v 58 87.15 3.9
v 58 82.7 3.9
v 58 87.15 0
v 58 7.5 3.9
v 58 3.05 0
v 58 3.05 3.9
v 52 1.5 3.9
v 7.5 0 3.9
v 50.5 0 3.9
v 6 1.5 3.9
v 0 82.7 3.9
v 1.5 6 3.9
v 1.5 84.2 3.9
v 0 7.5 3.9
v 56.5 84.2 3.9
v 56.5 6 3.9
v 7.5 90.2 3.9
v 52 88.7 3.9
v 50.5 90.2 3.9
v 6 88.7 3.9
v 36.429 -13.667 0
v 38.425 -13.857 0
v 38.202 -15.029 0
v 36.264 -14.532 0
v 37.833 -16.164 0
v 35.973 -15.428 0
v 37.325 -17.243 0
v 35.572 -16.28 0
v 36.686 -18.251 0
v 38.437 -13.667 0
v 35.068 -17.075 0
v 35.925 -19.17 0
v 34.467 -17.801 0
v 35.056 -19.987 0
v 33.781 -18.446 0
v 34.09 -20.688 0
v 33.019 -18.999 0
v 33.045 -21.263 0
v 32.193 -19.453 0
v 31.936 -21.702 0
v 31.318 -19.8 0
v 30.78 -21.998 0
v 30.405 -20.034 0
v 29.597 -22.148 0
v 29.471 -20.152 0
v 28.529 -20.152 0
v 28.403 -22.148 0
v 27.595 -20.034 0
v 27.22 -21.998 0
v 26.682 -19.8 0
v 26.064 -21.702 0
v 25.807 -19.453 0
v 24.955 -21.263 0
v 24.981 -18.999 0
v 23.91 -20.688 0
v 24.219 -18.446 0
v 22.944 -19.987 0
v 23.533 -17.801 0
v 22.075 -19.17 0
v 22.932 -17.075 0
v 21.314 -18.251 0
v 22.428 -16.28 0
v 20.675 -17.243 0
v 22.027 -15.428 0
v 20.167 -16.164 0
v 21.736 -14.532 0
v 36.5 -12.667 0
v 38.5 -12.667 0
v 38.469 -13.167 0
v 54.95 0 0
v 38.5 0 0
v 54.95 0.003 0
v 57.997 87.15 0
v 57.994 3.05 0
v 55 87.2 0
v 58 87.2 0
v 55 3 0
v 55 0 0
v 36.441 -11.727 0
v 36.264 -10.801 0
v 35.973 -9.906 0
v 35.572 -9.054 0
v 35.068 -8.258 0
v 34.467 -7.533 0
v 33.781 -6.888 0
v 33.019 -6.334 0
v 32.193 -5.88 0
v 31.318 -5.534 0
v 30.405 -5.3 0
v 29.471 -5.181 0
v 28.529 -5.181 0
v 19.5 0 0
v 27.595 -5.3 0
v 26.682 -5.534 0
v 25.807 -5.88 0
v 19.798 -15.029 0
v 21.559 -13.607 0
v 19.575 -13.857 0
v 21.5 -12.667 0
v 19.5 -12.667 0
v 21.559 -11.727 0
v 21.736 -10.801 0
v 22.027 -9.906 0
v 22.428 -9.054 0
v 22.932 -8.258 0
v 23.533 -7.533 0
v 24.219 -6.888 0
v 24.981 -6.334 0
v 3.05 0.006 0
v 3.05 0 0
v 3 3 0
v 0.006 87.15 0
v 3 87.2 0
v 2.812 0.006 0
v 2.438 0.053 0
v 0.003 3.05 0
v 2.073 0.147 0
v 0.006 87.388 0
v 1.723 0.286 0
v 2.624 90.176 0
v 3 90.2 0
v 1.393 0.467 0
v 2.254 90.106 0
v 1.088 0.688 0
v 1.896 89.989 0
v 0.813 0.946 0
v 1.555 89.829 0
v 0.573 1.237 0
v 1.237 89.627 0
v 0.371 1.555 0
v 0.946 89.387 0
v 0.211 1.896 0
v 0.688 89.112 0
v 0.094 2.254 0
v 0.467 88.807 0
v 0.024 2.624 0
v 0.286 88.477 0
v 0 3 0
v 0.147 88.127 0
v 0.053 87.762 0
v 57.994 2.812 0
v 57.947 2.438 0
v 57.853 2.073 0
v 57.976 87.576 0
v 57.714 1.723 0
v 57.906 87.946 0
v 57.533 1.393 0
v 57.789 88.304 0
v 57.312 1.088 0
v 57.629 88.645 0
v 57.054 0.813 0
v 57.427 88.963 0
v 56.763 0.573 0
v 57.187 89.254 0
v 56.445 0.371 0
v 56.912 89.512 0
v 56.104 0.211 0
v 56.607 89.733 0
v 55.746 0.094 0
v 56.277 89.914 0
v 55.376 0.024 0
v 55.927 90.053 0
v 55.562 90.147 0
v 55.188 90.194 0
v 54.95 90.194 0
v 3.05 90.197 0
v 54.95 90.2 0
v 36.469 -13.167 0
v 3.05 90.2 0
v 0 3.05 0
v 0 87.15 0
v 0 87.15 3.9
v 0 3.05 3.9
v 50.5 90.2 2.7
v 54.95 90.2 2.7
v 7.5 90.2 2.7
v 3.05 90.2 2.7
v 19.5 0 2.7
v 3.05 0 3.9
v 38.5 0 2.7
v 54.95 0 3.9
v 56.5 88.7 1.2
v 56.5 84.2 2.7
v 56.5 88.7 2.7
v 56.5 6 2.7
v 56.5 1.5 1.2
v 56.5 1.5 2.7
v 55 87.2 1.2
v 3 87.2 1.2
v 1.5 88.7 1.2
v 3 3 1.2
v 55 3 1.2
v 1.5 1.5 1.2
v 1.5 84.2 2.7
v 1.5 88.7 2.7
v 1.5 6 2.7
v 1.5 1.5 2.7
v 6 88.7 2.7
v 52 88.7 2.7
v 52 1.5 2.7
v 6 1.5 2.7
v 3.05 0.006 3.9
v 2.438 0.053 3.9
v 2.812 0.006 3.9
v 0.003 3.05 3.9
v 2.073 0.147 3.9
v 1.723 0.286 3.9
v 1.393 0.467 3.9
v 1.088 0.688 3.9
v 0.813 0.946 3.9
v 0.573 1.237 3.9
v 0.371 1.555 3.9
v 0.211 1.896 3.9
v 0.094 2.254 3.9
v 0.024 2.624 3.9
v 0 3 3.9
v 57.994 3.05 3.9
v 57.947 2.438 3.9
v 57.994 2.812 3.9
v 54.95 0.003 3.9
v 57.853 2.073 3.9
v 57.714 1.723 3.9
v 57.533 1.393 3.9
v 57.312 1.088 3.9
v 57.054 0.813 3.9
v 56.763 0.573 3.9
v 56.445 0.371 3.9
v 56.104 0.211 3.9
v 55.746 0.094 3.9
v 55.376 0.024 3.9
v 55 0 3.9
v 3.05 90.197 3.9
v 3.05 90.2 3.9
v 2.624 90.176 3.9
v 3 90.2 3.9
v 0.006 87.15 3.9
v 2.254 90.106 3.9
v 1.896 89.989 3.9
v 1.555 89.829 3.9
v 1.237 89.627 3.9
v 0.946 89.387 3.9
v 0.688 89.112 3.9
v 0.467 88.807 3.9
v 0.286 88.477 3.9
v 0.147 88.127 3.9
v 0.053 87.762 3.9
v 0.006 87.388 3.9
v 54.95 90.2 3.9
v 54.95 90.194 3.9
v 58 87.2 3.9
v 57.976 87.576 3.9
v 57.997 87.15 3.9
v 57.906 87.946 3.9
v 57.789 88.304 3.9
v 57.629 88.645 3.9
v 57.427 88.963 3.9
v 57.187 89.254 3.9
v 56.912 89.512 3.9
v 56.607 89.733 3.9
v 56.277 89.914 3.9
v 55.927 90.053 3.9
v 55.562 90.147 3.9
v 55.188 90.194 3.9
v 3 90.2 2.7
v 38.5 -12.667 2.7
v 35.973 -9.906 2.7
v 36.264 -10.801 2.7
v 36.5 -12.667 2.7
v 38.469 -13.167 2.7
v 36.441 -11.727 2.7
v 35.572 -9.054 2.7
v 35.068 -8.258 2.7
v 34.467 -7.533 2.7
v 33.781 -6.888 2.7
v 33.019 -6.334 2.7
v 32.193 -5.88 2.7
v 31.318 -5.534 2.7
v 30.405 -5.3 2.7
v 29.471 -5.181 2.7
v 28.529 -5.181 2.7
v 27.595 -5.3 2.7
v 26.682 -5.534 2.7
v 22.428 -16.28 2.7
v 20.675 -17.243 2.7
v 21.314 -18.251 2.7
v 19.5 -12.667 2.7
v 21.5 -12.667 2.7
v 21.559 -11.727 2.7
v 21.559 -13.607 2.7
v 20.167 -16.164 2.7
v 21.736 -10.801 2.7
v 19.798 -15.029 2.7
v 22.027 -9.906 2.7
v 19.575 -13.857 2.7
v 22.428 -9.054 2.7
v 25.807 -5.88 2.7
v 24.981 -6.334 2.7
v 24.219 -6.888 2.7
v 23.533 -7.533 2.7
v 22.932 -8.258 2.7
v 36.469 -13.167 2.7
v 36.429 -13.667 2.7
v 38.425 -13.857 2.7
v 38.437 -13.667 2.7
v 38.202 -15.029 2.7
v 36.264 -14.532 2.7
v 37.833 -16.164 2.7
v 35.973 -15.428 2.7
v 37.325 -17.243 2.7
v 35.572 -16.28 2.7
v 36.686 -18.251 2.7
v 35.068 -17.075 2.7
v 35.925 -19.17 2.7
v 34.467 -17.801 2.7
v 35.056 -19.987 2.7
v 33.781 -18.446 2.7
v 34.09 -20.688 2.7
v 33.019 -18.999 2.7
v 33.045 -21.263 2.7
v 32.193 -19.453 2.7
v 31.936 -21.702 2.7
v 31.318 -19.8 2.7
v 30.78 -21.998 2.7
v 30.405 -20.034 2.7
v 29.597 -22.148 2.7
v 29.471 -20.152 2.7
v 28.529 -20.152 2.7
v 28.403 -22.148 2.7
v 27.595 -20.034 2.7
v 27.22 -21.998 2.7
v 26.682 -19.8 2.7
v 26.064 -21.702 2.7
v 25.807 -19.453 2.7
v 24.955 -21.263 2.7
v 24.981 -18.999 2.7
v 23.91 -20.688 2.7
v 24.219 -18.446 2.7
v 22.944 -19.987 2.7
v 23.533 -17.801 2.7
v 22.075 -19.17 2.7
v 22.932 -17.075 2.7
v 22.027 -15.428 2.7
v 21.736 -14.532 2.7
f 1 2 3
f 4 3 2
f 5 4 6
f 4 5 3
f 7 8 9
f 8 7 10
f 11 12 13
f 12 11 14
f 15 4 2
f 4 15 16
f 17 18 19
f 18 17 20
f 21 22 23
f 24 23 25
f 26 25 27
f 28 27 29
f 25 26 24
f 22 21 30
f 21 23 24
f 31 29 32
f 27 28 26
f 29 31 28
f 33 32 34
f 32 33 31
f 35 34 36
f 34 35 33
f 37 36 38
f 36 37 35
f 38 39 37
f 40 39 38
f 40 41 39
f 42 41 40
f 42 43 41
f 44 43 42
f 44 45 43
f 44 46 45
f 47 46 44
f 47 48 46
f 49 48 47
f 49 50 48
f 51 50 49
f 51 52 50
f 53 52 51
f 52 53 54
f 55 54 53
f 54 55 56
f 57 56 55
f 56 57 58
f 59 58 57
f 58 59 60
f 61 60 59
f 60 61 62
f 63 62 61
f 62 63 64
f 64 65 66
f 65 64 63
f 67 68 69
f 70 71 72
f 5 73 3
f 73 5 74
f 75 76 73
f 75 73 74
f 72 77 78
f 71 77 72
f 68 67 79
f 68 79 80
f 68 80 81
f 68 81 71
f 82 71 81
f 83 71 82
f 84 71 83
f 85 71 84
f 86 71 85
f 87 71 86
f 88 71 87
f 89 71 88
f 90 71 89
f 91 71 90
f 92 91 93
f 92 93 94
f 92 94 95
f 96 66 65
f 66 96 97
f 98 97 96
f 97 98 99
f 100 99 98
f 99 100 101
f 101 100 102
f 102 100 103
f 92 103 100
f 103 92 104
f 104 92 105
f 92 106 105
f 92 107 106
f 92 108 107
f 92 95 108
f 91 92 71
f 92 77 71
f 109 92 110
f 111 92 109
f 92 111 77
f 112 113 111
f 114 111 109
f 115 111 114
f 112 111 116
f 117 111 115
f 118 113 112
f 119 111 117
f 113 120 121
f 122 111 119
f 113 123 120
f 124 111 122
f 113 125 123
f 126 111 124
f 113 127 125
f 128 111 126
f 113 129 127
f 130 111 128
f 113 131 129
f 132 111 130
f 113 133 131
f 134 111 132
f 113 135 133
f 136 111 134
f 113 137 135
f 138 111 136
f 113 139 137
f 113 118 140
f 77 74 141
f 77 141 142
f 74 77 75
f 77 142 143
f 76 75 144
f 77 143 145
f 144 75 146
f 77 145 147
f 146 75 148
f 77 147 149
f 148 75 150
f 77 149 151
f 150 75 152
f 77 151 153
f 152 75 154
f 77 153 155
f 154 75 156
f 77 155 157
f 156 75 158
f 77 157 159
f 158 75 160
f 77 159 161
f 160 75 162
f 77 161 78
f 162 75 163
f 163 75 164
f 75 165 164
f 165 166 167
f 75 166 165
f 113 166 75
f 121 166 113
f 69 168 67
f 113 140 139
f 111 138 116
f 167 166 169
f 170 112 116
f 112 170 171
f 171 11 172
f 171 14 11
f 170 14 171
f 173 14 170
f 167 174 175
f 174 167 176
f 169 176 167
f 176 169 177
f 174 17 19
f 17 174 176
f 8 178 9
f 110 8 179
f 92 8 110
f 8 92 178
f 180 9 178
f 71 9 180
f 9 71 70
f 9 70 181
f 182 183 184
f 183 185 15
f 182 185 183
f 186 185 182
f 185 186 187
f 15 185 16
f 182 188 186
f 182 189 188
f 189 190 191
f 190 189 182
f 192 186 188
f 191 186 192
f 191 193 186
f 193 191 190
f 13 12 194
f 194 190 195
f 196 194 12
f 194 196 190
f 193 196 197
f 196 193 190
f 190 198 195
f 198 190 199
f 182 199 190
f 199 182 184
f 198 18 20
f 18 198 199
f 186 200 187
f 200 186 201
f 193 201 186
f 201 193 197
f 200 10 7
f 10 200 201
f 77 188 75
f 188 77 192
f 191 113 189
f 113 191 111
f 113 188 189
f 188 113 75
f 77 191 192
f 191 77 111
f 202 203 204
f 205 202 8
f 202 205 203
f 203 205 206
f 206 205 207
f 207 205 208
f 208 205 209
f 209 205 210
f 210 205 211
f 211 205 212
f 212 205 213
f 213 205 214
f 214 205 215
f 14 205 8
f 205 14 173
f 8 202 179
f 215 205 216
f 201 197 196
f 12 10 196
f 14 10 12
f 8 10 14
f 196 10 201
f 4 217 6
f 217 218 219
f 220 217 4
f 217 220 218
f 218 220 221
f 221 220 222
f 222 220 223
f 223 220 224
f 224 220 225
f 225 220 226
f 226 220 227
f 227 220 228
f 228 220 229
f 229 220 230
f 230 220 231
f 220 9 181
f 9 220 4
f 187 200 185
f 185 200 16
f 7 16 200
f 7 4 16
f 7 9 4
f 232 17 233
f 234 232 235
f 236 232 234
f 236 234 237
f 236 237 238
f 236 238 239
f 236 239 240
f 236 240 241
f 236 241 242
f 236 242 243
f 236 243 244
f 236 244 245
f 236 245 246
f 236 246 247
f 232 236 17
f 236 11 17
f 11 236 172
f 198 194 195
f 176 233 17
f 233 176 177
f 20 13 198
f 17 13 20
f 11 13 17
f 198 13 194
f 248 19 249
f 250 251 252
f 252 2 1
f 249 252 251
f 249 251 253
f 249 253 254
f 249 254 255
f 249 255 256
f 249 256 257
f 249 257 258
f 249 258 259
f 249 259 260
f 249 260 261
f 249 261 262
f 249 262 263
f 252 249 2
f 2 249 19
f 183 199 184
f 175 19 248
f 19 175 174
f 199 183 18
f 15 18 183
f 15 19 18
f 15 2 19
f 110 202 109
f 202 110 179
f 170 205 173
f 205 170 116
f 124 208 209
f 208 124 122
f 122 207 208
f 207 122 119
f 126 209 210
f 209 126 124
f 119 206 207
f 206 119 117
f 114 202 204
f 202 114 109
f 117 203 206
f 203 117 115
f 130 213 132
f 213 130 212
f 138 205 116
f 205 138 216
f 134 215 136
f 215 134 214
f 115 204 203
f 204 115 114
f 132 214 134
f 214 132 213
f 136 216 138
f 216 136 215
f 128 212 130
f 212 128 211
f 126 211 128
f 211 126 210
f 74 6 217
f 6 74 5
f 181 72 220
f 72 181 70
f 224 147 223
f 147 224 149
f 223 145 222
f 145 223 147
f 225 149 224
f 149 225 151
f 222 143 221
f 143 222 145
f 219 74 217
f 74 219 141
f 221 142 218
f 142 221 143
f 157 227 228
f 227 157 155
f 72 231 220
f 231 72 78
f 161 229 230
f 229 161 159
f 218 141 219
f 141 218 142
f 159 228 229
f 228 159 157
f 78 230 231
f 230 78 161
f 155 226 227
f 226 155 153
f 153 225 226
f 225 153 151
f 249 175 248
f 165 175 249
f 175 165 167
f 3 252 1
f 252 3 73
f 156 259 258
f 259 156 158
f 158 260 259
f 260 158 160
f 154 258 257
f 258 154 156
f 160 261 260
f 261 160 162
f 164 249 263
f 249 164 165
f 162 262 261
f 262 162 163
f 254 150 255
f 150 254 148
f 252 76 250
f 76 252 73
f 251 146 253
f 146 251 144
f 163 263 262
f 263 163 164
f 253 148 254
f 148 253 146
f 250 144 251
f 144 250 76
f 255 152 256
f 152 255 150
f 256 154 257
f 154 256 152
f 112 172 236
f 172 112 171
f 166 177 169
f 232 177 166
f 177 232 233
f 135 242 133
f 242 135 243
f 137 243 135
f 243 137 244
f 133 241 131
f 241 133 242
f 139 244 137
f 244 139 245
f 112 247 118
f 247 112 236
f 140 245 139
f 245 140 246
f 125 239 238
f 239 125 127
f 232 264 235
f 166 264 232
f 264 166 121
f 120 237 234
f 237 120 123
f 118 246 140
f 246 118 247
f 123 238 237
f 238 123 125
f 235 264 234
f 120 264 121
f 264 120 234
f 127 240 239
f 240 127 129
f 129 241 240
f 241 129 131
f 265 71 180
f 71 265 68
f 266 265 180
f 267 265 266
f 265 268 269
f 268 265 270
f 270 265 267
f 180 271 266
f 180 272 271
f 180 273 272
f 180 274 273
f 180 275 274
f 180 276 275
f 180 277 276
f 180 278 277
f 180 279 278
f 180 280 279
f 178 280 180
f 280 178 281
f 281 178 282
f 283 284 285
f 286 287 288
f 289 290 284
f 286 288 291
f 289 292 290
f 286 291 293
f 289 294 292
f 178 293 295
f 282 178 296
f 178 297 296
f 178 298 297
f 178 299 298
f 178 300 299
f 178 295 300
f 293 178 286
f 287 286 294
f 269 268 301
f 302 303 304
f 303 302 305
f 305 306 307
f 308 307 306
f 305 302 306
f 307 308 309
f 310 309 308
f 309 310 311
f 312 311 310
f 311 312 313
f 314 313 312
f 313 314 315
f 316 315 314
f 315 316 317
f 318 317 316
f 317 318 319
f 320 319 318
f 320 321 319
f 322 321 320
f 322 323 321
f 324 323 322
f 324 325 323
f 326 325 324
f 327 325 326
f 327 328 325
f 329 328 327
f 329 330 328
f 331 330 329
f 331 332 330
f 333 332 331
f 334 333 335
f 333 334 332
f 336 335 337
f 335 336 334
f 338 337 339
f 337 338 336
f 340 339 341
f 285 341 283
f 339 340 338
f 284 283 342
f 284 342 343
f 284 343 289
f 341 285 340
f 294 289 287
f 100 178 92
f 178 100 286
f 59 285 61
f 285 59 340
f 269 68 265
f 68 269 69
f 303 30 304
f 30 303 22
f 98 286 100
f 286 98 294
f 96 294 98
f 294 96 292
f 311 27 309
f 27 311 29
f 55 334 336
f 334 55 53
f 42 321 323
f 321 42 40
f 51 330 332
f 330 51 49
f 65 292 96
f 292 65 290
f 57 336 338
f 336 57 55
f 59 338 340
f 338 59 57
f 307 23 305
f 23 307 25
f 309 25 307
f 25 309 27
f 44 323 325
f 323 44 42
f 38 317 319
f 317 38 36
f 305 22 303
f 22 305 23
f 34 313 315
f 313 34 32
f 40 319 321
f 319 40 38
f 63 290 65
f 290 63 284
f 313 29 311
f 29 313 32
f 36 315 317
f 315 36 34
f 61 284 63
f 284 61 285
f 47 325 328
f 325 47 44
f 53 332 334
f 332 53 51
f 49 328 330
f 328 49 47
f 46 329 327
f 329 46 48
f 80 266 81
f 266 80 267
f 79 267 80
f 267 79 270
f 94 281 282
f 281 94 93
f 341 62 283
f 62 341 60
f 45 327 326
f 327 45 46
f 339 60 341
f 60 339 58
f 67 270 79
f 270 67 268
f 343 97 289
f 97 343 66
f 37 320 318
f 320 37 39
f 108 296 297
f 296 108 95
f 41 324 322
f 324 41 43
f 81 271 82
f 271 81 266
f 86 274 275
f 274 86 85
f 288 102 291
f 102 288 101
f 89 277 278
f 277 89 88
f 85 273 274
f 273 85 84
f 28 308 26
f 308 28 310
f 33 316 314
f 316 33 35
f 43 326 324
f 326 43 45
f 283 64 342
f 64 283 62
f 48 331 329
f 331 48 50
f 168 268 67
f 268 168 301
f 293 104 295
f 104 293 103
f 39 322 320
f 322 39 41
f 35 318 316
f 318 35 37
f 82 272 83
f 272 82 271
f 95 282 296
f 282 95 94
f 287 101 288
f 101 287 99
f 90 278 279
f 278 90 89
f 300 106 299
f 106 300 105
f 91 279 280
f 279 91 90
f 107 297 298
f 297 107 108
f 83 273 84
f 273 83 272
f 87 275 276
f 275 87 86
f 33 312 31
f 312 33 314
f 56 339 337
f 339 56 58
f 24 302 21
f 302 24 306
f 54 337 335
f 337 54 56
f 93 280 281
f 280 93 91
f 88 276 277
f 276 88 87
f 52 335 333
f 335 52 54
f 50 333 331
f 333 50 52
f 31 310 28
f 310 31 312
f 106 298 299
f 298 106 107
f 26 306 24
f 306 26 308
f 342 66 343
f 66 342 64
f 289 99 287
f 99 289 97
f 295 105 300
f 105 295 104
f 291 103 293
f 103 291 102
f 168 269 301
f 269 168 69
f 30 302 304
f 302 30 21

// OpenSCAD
//card height (Y axis)
card_height = 87.2;
//card width (X axis)
card_width = 55;
//card thickness (Z axis)
card_thickness = 1.5;
//frame out thickness
frame_out_thickness = 1.5;
//frame in thickness
frame_in_thickness = 1.5;
//holder thickness (tip: totalThickness = 2*holder_thickness + card_thickness)
holder_thickness = 1.2;
//corner size
corner_size = 6;

//key ring radius (outside)
key_ring_radius = 9.5;
//key ring thickness (Z axis)
key_ring_thickness = card_thickness+holder_thickness;
//key ring circle thickness
key_ring_circle_thickness = 2;
//key ring separation (respect to the card holder) >= key ring radius
key_ring_separation = key_ring_radius*4/3;

//round corner
round_radius = 3;

//symmetrical design
symmetrical = 0; // [1,0]

//opened key_ring
openedkey_ring = 1; // [1,0]

$fn=50;

module roundCreator()
{
    round_length = 2*holder_thickness + card_thickness + 0.01;
    difference(){
       translate([-0.05,-0.05,0]) cube([round_radius+0.1,round_radius+0.1,round_length], center = false);
       translate([round_radius, round_radius, 0]) cylinder(round_length, round_radius, round_radius, false);
    }
}

module cardkey_ring()
{
    difference()
        {
            diag=pow(pow(corner_size+frame_out_thickness,2)*2,0.5);            
            cube([corner_size+frame_out_thickness,corner_size+frame_out_thickness,holder_thickness], center = false);
            translate([0, corner_size+frame_out_thickness, 0])  rotate([0,0,-45])
            cube([diag,diag,holder_thickness], center = false);
        }
}

module fullCardkey_ring()
{
        translate([0, 0, holder_thickness+card_thickness]) cardkey_ring();
        translate([card_width+frame_out_thickness*2, 0, holder_thickness+card_thickness]) rotate([0,0,90]) cardkey_ring();
        translate([0, card_height+frame_out_thickness*2, holder_thickness+card_thickness]) rotate([0,0,-90]) cardkey_ring();
        translate([card_width+frame_out_thickness*2, card_height+frame_out_thickness*2, holder_thickness+card_thickness]) rotate([0,0,180]) cardkey_ring();
}

module bruteHolder()
{
        difference()
        {
            cube([card_width+2*frame_out_thickness,card_height+2*frame_out_thickness,card_thickness+holder_thickness*2], center = false);
            translate([frame_out_thickness, frame_out_thickness, holder_thickness])
            cube([card_width,card_height,card_thickness+holder_thickness], center = false);
            //translate([frame_in_thickness+frame_out_thickness, frame_in_thickness+frame_out_thickness, 0])
            if(!symmetrical){
                translate([frame_in_thickness+frame_out_thickness, frame_in_thickness+frame_out_thickness, 0])
                cube([card_width-2*frame_in_thickness,card_height-2*frame_in_thickness,holder_thickness], center = false);
            } else {
                translate([frame_out_thickness, frame_out_thickness, 0])
                cube([card_width,card_height,holder_thickness], center = false);
            }
        }
        fullCardkey_ring();
        if(symmetrical){
            translate([0, 0, -card_thickness-holder_thickness]) fullCardkey_ring();
        }
}
    
module prekey_ring()
{
    translate([(card_width+2*frame_out_thickness)/2-(key_ring_radius),-key_ring_separation, 0])
    cube([key_ring_radius*2,key_ring_separation,key_ring_thickness], center = false);
    translate([(card_width+2*frame_out_thickness)/2,-key_ring_separation, 0])  
    cylinder(key_ring_thickness, key_ring_radius, key_ring_radius, false);
}

difference()
{
    bruteHolder();
    roundCreator();
    translate([(card_width+frame_out_thickness*2), 0, 0])
    rotate([0,0,90])
    roundCreator();

    translate([(card_width+frame_out_thickness*2), (card_height+frame_out_thickness*2), 0])
    rotate([0,0,180])
    roundCreator();
    translate([0, (card_height+frame_out_thickness*2), 0])
    rotate([0,0,270])
    roundCreator();
}

precission_margin=0.5;
difference()
{
    prekey_ring();
    translate([(card_width+2*frame_out_thickness)/2,-key_ring_separation, 0]) 
    cylinder(key_ring_thickness, key_ring_radius-key_ring_circle_thickness, key_ring_radius-key_ring_circle_thickness, false);
    if(openedkey_ring){
        translate([(card_width+2*frame_out_thickness)/2+(key_ring_radius-key_ring_circle_thickness)-(precission_margin/2),-(key_ring_separation+key_ring_circle_thickness/2), 0]) 
        cube([key_ring_circle_thickness+precission_margin,0.5,key_ring_thickness], center = false);
    }
}
